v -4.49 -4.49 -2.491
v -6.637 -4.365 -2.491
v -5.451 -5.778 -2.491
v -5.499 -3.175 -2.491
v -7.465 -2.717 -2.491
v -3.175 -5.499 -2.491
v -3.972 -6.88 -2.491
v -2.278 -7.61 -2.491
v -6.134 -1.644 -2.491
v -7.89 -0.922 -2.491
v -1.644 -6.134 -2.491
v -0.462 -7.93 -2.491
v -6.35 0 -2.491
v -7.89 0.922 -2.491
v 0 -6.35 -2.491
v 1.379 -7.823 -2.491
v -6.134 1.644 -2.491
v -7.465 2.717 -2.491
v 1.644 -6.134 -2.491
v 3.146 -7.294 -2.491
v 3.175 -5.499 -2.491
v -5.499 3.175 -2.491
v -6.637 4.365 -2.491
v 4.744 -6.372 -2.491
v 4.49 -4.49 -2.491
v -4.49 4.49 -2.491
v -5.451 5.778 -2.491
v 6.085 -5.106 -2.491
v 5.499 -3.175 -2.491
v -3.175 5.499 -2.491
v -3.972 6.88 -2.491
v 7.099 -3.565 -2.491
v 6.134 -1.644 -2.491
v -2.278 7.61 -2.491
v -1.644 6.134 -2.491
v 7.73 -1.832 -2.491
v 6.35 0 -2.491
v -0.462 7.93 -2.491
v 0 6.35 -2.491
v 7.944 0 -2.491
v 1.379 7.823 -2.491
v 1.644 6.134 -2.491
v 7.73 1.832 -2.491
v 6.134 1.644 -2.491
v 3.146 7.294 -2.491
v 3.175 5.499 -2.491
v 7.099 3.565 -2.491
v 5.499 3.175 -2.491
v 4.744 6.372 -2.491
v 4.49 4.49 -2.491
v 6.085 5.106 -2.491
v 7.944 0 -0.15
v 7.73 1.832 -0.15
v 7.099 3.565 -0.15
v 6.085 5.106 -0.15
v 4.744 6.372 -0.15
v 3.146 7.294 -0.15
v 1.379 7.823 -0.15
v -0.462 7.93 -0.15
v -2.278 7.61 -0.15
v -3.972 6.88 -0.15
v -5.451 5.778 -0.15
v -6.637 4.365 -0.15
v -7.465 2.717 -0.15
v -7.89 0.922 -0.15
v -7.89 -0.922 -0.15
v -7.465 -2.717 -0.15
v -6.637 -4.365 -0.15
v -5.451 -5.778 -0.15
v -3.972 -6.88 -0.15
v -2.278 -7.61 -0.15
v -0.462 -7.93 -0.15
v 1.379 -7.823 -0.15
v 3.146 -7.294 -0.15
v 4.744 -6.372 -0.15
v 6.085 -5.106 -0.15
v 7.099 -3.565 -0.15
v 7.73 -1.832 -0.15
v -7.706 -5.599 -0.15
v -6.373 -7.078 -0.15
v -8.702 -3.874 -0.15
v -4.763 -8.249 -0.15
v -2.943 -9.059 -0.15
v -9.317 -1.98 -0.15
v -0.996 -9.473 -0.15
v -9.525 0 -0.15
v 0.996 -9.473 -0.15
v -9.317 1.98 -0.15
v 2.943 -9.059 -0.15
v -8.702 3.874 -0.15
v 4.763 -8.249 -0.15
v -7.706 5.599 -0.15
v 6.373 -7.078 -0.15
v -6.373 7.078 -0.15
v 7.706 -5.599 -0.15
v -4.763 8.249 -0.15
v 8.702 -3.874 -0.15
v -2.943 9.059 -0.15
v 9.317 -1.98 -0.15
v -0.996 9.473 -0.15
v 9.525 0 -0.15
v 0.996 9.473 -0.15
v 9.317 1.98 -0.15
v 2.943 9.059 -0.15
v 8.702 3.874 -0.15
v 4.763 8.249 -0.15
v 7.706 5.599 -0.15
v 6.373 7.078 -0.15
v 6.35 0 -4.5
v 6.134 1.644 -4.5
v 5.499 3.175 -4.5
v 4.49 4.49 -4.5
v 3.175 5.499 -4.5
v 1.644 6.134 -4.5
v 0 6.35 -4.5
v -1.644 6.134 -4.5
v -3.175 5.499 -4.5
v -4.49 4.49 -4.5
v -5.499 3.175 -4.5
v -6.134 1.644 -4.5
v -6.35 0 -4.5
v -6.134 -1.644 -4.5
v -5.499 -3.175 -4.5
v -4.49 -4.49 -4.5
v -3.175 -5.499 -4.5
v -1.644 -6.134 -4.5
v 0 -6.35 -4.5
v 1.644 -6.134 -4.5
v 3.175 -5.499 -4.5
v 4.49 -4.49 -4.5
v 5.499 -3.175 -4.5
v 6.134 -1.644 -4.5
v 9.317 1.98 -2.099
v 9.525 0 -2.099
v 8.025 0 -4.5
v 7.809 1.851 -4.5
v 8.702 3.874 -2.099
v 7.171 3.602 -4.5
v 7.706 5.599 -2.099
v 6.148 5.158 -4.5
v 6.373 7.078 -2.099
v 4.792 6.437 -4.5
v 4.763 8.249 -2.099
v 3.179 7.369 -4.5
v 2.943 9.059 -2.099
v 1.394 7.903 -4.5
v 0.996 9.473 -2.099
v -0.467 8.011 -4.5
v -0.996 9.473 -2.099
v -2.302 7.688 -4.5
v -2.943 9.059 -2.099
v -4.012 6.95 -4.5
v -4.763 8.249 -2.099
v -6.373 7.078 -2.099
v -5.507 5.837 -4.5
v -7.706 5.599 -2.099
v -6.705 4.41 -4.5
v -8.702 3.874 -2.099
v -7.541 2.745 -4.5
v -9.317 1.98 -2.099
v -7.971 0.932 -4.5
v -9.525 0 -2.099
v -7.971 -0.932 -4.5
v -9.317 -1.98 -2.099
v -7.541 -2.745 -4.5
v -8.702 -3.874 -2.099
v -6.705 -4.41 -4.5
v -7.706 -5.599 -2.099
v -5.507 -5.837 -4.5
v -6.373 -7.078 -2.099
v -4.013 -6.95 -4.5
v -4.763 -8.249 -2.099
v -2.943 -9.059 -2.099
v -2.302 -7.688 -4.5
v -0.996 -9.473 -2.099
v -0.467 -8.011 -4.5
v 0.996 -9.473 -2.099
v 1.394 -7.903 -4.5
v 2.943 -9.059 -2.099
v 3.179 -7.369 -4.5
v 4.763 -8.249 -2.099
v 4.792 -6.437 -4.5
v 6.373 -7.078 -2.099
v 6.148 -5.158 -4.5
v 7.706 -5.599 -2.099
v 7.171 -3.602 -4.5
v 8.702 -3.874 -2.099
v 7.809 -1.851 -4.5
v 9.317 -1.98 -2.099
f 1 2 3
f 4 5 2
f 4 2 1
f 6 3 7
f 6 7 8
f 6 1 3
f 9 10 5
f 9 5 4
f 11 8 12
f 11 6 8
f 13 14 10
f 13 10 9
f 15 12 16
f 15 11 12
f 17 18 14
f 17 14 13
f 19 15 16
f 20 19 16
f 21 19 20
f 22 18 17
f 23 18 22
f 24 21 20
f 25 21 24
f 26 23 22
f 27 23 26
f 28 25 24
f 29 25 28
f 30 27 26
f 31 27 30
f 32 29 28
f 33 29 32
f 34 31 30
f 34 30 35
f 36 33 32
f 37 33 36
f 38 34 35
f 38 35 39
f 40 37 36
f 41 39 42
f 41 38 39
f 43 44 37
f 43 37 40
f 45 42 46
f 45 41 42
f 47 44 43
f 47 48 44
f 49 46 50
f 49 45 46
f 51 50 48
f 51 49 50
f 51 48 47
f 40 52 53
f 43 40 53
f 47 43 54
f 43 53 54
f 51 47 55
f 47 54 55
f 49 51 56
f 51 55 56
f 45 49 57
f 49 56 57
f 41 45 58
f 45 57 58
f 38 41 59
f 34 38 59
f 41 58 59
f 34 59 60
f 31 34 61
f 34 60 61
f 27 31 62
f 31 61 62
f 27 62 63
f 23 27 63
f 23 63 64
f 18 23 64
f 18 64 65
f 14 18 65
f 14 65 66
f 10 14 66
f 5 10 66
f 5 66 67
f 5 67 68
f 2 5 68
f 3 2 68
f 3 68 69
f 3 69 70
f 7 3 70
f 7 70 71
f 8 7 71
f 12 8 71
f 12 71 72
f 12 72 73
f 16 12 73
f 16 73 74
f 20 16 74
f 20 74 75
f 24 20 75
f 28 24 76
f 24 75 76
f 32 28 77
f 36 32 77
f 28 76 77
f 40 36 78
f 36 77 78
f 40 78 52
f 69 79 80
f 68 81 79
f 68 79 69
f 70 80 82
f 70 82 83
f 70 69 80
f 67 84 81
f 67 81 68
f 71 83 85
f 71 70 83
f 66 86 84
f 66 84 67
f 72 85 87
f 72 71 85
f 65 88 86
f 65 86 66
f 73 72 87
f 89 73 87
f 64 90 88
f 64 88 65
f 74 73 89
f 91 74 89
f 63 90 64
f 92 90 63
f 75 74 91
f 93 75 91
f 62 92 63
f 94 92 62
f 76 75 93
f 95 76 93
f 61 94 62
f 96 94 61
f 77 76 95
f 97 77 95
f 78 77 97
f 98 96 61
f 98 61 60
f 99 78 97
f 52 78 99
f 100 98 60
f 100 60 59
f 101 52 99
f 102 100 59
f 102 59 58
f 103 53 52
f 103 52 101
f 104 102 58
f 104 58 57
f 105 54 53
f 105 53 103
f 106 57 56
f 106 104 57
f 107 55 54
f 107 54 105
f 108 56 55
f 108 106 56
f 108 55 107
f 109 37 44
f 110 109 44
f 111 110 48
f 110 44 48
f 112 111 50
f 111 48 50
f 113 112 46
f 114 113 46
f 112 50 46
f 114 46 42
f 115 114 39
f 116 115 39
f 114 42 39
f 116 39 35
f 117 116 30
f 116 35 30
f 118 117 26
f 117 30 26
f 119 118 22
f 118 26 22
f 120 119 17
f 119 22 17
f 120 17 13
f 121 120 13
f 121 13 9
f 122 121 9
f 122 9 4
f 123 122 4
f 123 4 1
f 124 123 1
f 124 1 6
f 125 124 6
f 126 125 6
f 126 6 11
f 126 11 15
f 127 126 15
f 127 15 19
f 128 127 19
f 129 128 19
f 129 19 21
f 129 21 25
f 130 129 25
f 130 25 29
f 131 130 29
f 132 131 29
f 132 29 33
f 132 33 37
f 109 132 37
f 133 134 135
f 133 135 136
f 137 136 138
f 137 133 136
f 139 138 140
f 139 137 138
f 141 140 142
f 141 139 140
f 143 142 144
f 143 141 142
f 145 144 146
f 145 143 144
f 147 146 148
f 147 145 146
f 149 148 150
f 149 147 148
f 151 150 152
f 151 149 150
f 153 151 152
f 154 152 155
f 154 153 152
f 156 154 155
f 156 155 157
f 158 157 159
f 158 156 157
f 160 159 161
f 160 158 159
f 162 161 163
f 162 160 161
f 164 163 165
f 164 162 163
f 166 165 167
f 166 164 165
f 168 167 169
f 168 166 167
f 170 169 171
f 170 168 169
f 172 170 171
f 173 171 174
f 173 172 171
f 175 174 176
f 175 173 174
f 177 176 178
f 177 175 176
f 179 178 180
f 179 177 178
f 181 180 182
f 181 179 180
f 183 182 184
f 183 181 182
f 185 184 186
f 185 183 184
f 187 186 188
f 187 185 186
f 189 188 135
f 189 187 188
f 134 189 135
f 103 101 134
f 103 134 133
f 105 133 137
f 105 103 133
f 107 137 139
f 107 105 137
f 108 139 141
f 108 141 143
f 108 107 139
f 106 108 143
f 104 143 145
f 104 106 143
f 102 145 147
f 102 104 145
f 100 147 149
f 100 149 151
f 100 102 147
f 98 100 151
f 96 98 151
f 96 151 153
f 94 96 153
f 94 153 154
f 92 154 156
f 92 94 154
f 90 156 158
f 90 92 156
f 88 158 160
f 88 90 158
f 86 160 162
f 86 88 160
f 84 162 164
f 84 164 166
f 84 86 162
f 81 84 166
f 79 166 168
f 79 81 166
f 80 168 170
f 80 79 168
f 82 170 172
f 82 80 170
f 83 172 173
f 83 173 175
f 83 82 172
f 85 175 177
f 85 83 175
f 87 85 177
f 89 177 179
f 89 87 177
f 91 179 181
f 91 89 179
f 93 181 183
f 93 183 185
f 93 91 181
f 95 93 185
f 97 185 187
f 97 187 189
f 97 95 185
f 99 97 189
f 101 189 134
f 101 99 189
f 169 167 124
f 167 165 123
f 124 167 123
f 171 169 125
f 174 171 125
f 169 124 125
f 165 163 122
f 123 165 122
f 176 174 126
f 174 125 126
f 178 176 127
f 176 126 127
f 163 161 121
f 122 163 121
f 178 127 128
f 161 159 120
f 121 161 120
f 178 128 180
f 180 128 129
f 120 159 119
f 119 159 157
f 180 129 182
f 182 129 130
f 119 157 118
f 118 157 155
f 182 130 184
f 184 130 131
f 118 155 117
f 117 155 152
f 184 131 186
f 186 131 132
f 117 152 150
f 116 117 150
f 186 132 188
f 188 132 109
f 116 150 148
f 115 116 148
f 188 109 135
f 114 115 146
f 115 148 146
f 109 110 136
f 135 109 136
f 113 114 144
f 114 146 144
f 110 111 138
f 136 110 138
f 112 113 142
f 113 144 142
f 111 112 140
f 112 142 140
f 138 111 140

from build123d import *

# Parameters (mm, degrees)
SKETCH1_R             = 9.525
BOSS_EXTRUDE1_DEPTH   = 4.5
SKETCH2_R             = 6.35
CUT_EXTRUDE1_DEPTH    = 10
CHAMFER1_SIZE         = 1.5
CHAMFER1_SIZE2        = 2.400501794
CHAMFER1_PART_2_SIZE  = 1.5
CHAMFER1_PART_2_SIZE2 = 2.400501794
SKETCH3_R             = 7.874
CUT_EXTRUDE2_DEPTH    = 2.011
SKETCH4_R             = 7.94385
CUT_EXTRUDE3_DEPTH    = 4.98
SKETCH5_R             = 24.237402282
CUT_EXTRUDE4_DEPTH    = 5.5
SKETCH6_R             = 11.614236141
CUT_EXTRUDE5_DEPTH    = 0.15


with BuildPart() as part:
    # Sketch1 → Boss-Extrude1 (new body, symmetric)
    with BuildSketch(Plane.XY):
        Circle(SKETCH1_R)
    extrude(amount=BOSS_EXTRUDE1_DEPTH, both=True)

    # Sketch2 → Cut-Extrude1 (cut, through all)
    with BuildSketch(Plane.XY.offset(4.5)):
        Circle(SKETCH2_R)
    extrude(amount=-CUT_EXTRUDE1_DEPTH, mode=Mode.SUBTRACT)

    # Chamfer1
    chamfer1_edges = [part.edges().sort_by_distance(p)[0] for p in [
        (-9.525, 0, -4.5),
    ]]
    chamfer1_side = [part.faces().sort_by_distance(p)[0] for p in [
        (-9.255592316, 0, -4.5),
    ]]
    chamfer(chamfer1_edges, length=CHAMFER1_SIZE, length2=CHAMFER1_SIZE2, reference=chamfer1_side[0])

    # Chamfer1 part 2
    chamfer1_part_2_edges = [part.edges().sort_by_distance(p)[0] for p in [
        (-9.525, 0, 4.5),
    ]]
    chamfer1_part_2_side = [part.faces().sort_by_distance(p)[0] for p in [
        (-9.255592316, 0, 4.5),
    ]]
    chamfer(chamfer1_part_2_edges, length=CHAMFER1_PART_2_SIZE, length2=CHAMFER1_PART_2_SIZE2, reference=chamfer1_part_2_side[0])

    # Sketch3 → Cut-Extrude2 (cut)
    with BuildSketch(Plane.XY.offset(4.5)):
        Circle(SKETCH3_R)
    extrude(amount=-CUT_EXTRUDE2_DEPTH, mode=Mode.SUBTRACT)

    # Sketch4 → Cut-Extrude3 (cut)
    with BuildSketch(Plane.XY.offset(2.489)):
        Circle(SKETCH4_R)
    extrude(amount=-CUT_EXTRUDE3_DEPTH, mode=Mode.SUBTRACT)

    # Sketch5 → Cut-Extrude4 (cut, through all)
    with BuildSketch(Plane.XY):
        Circle(SKETCH5_R)
    extrude(amount=CUT_EXTRUDE4_DEPTH, mode=Mode.SUBTRACT)

    # Sketch6 → Cut-Extrude5 (cut)
    with BuildSketch(Plane.XY):
        Circle(SKETCH6_R)
    extrude(amount=-CUT_EXTRUDE5_DEPTH, mode=Mode.SUBTRACT)


solid = part.part
